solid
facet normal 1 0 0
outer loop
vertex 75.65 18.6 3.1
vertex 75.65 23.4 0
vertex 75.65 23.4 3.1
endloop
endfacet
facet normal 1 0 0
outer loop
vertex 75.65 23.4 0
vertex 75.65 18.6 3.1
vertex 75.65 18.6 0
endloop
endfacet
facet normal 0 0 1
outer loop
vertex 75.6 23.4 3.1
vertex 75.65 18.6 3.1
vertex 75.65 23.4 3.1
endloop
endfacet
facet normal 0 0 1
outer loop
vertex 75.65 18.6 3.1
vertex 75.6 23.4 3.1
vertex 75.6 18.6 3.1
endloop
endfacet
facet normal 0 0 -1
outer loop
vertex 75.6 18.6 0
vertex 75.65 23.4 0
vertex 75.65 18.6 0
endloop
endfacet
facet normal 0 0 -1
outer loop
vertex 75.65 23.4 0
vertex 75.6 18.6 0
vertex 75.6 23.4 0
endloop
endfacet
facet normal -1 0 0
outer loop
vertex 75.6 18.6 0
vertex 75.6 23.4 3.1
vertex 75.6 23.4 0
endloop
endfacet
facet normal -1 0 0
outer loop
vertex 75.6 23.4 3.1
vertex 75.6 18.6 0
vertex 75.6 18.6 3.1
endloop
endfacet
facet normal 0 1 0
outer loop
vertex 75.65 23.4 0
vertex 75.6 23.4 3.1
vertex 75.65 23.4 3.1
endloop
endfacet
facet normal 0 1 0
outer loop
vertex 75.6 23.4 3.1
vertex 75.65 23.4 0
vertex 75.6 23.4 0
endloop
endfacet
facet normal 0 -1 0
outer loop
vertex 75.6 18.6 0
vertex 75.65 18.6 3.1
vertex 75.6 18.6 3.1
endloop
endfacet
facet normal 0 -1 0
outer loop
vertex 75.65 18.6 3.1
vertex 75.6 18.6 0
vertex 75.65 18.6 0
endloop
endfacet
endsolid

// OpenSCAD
case_name="old_pair";
module box(x,y,z,w,d,h){translate([x,y,z])cube([w,d,h]);}
if(case_name=="old_pair")intersection(){box(65.35,18.35,-.25,10.3,5.3,3.6);box(75.6,18.6,0,9.8,4.8,3.1);}
if(case_name=="new_pair")intersection(){box(65.35,18.35,-.25,10.3,5.3,3.6);box(76.6,18.6,0,9.8,4.8,3.1);}
